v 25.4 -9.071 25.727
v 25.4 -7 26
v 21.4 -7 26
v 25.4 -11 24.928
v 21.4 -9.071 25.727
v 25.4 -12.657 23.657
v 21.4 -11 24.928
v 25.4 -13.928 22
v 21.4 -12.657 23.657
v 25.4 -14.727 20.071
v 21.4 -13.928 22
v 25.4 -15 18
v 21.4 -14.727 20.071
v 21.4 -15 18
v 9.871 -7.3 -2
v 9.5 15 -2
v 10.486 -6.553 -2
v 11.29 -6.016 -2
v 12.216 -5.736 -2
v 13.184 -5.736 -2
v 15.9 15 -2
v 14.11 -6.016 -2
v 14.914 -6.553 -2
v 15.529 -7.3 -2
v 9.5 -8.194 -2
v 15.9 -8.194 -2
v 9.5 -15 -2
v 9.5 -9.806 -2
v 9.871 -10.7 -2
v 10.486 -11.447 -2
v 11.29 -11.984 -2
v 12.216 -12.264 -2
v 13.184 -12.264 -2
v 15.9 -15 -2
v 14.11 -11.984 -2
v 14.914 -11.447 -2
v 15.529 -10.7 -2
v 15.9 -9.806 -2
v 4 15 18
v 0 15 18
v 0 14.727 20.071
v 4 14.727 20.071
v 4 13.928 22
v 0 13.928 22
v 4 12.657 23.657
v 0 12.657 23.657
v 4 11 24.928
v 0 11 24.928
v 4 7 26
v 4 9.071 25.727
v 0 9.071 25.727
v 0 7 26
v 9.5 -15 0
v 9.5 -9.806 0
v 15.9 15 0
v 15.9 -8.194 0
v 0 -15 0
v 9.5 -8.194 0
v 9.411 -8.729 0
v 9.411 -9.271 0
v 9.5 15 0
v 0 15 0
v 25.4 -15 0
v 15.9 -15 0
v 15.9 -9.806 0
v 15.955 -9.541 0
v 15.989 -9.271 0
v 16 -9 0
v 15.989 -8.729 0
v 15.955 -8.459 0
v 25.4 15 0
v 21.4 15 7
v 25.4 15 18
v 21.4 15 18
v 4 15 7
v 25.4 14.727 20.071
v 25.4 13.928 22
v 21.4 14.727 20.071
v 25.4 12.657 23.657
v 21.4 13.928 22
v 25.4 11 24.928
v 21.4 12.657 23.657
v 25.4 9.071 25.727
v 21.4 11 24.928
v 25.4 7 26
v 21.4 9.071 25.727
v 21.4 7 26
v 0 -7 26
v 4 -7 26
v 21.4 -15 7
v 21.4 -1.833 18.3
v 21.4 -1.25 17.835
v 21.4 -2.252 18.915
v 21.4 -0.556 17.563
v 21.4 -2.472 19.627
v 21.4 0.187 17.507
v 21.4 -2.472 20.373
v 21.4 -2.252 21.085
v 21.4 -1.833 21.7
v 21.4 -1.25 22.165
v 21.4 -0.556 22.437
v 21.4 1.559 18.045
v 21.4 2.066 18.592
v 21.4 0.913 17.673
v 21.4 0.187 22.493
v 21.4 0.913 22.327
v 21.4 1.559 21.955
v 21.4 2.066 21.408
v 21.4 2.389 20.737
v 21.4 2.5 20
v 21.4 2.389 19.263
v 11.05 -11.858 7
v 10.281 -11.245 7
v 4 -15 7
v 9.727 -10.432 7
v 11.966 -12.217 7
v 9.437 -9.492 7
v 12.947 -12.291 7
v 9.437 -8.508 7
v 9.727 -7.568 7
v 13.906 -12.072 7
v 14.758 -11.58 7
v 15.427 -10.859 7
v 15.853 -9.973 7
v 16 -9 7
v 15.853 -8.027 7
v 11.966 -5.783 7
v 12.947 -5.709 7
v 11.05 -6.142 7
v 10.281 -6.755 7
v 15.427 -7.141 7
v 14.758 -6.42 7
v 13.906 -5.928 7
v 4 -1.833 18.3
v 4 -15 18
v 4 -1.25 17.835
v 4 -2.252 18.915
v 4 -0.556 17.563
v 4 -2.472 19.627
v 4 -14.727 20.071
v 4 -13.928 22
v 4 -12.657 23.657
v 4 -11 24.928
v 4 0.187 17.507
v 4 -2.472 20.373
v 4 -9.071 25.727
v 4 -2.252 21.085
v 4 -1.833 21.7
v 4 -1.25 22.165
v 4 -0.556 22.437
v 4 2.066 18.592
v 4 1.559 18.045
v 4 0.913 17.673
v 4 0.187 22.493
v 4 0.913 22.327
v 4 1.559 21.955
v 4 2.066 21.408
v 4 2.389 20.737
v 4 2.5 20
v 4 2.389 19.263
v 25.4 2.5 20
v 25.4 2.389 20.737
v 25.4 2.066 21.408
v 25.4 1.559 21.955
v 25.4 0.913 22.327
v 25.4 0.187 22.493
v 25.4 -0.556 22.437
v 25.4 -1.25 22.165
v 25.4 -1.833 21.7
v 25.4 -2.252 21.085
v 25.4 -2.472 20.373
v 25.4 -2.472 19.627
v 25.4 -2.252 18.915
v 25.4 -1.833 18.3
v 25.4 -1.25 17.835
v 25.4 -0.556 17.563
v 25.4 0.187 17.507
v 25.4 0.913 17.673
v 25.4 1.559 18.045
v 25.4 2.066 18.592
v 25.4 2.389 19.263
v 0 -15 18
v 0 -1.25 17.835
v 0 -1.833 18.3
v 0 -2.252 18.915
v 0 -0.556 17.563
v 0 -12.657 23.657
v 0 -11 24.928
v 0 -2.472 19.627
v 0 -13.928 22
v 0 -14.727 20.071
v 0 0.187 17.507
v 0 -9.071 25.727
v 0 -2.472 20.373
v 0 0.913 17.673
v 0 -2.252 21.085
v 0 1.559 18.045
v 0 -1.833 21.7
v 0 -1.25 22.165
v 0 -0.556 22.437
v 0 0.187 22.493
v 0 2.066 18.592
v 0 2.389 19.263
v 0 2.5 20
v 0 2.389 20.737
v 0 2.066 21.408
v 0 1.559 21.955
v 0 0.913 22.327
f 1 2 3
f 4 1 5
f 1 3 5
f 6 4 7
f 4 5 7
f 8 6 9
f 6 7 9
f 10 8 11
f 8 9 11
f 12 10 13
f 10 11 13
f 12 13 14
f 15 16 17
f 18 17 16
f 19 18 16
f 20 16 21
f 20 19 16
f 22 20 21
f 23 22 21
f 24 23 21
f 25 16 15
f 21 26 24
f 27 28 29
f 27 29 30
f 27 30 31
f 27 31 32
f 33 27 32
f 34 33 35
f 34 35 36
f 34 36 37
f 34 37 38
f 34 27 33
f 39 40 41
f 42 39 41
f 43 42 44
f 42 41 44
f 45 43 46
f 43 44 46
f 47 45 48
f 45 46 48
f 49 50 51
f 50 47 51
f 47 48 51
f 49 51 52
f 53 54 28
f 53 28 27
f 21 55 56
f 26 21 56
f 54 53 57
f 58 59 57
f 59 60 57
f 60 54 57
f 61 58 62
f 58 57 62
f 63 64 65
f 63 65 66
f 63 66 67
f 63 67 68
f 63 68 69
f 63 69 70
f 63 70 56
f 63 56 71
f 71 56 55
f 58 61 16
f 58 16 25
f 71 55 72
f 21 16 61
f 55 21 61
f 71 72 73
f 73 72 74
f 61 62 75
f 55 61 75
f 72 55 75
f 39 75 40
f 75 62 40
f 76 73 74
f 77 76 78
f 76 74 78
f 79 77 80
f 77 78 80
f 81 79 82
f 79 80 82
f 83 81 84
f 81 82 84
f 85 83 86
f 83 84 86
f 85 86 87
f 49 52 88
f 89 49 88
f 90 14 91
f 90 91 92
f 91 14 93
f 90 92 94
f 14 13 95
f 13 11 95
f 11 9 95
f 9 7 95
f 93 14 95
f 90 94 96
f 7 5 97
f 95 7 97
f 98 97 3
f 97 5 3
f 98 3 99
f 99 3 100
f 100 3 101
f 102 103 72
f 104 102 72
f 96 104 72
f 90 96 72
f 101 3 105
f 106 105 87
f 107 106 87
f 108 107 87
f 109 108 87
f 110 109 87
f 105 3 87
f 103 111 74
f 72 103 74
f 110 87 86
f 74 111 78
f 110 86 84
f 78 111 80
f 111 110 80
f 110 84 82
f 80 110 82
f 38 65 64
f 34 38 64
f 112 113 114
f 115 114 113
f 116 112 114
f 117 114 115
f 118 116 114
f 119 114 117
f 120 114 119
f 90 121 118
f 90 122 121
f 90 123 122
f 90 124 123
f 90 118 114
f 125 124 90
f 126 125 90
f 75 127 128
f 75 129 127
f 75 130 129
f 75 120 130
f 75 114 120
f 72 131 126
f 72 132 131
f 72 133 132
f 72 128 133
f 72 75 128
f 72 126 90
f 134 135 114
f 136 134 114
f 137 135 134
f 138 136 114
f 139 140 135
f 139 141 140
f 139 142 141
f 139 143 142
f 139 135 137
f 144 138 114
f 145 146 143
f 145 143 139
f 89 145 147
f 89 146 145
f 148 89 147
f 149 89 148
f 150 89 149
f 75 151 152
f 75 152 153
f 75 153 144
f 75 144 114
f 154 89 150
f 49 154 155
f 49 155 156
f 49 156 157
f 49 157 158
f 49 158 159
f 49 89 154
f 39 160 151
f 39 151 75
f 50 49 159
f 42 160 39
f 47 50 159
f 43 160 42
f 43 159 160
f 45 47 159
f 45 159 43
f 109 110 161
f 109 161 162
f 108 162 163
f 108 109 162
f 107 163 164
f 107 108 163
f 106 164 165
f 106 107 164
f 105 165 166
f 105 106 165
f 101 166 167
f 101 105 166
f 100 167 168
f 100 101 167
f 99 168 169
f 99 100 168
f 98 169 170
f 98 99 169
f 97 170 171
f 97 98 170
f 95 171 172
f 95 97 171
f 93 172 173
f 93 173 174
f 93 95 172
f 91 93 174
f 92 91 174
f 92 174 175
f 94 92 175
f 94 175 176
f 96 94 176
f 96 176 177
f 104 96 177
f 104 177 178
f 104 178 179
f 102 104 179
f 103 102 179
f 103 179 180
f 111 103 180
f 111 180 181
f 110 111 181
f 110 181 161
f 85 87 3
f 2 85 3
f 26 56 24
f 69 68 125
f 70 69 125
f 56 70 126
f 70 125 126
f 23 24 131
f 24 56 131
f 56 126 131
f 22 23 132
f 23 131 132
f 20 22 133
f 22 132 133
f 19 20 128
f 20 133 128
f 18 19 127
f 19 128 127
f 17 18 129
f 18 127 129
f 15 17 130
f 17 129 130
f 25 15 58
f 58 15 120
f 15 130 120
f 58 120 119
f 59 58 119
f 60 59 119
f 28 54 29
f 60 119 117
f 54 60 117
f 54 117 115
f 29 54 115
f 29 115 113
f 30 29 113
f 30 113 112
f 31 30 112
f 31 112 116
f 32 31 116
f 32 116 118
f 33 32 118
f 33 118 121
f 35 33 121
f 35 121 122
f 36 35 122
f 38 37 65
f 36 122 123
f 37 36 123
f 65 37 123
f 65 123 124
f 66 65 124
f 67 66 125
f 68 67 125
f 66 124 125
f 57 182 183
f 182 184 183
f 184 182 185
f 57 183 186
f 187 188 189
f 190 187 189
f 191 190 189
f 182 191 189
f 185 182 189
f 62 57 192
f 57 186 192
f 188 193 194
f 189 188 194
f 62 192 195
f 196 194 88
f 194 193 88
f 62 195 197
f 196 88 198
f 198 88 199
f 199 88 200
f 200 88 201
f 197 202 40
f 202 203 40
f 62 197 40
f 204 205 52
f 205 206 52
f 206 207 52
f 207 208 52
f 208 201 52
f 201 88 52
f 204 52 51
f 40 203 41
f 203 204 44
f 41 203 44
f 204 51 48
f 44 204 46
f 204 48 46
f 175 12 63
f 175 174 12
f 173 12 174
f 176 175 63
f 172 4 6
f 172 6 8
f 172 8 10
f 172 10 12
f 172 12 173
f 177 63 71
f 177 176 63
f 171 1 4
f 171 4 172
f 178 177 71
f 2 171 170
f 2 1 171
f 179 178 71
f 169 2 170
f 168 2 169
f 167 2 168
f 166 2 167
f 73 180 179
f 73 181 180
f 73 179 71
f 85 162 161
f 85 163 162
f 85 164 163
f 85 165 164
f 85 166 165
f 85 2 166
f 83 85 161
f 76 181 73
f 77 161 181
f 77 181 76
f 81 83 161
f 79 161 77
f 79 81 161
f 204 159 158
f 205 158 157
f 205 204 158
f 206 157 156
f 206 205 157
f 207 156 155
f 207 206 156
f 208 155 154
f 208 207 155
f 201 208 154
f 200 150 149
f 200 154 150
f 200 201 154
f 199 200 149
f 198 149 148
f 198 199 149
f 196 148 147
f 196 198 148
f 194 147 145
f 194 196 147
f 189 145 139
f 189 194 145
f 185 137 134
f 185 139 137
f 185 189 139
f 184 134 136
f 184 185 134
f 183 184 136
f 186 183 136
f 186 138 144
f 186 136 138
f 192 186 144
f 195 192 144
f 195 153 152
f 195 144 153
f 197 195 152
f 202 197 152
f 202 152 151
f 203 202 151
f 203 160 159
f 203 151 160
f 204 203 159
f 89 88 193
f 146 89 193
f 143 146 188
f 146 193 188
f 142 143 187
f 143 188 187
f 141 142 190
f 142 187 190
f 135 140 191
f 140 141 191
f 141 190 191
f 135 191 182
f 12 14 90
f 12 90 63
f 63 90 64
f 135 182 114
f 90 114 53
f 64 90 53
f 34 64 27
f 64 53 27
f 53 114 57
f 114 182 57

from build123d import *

# Parameters (mm, degrees)
F0_R     = 2.5
F1_DEPTH = 25.4
F2_W     = 17.4
F2_H     = 38.590171
F3_DEPTH = 19
F4_W     = 6.4
F4_H     = 30
F5_DEPTH = 2
F6_R     = 3.3
F7_DEPTH = 10


with BuildPart() as f1:
    # F0 (on Right) → F1 (new body)
    with BuildSketch(Plane.YZ):
        with BuildLine():
            Line((7, 26), (-7, 26))
            ThreePointArc((-7, 26), (-12.656854, 23.656854), (-15, 18))
            Line((-15, 18), (-15, 0))
            Line((-15, 0), (15, 0))
            Line((15, 0), (15, 18))
            ThreePointArc((15, 18), (12.656854, 23.656854), (7, 26))
        make_face()
        with Locations((0, 20)):
            Circle(F0_R, mode=Mode.SUBTRACT)
    extrude(amount=F1_DEPTH)

    # F2 (on face) → F3 (cut)
    with BuildSketch(Plane.XY.offset(26)):
        with Locations((12.7, -0.404529)):
            Rectangle(F2_W, F2_H)
    extrude(amount=-F3_DEPTH, mode=Mode.SUBTRACT)

    # F4 (on face) → F5 (join)
    with BuildSketch(Plane(origin=(0, 0, 0), x_dir=(1, 0, 0), z_dir=(0, 0, -1))):
        with Locations((12.7, 0)):
            Rectangle(F4_W, F4_H)
    extrude(amount=F5_DEPTH)

    # F6 (on face) → F7 (cut)
    with BuildSketch(Plane.XY.offset(7)):
        with Locations((12.7, -9)):
            Circle(F6_R)
    extrude(amount=-F7_DEPTH, mode=Mode.SUBTRACT)


solid = f1.part
